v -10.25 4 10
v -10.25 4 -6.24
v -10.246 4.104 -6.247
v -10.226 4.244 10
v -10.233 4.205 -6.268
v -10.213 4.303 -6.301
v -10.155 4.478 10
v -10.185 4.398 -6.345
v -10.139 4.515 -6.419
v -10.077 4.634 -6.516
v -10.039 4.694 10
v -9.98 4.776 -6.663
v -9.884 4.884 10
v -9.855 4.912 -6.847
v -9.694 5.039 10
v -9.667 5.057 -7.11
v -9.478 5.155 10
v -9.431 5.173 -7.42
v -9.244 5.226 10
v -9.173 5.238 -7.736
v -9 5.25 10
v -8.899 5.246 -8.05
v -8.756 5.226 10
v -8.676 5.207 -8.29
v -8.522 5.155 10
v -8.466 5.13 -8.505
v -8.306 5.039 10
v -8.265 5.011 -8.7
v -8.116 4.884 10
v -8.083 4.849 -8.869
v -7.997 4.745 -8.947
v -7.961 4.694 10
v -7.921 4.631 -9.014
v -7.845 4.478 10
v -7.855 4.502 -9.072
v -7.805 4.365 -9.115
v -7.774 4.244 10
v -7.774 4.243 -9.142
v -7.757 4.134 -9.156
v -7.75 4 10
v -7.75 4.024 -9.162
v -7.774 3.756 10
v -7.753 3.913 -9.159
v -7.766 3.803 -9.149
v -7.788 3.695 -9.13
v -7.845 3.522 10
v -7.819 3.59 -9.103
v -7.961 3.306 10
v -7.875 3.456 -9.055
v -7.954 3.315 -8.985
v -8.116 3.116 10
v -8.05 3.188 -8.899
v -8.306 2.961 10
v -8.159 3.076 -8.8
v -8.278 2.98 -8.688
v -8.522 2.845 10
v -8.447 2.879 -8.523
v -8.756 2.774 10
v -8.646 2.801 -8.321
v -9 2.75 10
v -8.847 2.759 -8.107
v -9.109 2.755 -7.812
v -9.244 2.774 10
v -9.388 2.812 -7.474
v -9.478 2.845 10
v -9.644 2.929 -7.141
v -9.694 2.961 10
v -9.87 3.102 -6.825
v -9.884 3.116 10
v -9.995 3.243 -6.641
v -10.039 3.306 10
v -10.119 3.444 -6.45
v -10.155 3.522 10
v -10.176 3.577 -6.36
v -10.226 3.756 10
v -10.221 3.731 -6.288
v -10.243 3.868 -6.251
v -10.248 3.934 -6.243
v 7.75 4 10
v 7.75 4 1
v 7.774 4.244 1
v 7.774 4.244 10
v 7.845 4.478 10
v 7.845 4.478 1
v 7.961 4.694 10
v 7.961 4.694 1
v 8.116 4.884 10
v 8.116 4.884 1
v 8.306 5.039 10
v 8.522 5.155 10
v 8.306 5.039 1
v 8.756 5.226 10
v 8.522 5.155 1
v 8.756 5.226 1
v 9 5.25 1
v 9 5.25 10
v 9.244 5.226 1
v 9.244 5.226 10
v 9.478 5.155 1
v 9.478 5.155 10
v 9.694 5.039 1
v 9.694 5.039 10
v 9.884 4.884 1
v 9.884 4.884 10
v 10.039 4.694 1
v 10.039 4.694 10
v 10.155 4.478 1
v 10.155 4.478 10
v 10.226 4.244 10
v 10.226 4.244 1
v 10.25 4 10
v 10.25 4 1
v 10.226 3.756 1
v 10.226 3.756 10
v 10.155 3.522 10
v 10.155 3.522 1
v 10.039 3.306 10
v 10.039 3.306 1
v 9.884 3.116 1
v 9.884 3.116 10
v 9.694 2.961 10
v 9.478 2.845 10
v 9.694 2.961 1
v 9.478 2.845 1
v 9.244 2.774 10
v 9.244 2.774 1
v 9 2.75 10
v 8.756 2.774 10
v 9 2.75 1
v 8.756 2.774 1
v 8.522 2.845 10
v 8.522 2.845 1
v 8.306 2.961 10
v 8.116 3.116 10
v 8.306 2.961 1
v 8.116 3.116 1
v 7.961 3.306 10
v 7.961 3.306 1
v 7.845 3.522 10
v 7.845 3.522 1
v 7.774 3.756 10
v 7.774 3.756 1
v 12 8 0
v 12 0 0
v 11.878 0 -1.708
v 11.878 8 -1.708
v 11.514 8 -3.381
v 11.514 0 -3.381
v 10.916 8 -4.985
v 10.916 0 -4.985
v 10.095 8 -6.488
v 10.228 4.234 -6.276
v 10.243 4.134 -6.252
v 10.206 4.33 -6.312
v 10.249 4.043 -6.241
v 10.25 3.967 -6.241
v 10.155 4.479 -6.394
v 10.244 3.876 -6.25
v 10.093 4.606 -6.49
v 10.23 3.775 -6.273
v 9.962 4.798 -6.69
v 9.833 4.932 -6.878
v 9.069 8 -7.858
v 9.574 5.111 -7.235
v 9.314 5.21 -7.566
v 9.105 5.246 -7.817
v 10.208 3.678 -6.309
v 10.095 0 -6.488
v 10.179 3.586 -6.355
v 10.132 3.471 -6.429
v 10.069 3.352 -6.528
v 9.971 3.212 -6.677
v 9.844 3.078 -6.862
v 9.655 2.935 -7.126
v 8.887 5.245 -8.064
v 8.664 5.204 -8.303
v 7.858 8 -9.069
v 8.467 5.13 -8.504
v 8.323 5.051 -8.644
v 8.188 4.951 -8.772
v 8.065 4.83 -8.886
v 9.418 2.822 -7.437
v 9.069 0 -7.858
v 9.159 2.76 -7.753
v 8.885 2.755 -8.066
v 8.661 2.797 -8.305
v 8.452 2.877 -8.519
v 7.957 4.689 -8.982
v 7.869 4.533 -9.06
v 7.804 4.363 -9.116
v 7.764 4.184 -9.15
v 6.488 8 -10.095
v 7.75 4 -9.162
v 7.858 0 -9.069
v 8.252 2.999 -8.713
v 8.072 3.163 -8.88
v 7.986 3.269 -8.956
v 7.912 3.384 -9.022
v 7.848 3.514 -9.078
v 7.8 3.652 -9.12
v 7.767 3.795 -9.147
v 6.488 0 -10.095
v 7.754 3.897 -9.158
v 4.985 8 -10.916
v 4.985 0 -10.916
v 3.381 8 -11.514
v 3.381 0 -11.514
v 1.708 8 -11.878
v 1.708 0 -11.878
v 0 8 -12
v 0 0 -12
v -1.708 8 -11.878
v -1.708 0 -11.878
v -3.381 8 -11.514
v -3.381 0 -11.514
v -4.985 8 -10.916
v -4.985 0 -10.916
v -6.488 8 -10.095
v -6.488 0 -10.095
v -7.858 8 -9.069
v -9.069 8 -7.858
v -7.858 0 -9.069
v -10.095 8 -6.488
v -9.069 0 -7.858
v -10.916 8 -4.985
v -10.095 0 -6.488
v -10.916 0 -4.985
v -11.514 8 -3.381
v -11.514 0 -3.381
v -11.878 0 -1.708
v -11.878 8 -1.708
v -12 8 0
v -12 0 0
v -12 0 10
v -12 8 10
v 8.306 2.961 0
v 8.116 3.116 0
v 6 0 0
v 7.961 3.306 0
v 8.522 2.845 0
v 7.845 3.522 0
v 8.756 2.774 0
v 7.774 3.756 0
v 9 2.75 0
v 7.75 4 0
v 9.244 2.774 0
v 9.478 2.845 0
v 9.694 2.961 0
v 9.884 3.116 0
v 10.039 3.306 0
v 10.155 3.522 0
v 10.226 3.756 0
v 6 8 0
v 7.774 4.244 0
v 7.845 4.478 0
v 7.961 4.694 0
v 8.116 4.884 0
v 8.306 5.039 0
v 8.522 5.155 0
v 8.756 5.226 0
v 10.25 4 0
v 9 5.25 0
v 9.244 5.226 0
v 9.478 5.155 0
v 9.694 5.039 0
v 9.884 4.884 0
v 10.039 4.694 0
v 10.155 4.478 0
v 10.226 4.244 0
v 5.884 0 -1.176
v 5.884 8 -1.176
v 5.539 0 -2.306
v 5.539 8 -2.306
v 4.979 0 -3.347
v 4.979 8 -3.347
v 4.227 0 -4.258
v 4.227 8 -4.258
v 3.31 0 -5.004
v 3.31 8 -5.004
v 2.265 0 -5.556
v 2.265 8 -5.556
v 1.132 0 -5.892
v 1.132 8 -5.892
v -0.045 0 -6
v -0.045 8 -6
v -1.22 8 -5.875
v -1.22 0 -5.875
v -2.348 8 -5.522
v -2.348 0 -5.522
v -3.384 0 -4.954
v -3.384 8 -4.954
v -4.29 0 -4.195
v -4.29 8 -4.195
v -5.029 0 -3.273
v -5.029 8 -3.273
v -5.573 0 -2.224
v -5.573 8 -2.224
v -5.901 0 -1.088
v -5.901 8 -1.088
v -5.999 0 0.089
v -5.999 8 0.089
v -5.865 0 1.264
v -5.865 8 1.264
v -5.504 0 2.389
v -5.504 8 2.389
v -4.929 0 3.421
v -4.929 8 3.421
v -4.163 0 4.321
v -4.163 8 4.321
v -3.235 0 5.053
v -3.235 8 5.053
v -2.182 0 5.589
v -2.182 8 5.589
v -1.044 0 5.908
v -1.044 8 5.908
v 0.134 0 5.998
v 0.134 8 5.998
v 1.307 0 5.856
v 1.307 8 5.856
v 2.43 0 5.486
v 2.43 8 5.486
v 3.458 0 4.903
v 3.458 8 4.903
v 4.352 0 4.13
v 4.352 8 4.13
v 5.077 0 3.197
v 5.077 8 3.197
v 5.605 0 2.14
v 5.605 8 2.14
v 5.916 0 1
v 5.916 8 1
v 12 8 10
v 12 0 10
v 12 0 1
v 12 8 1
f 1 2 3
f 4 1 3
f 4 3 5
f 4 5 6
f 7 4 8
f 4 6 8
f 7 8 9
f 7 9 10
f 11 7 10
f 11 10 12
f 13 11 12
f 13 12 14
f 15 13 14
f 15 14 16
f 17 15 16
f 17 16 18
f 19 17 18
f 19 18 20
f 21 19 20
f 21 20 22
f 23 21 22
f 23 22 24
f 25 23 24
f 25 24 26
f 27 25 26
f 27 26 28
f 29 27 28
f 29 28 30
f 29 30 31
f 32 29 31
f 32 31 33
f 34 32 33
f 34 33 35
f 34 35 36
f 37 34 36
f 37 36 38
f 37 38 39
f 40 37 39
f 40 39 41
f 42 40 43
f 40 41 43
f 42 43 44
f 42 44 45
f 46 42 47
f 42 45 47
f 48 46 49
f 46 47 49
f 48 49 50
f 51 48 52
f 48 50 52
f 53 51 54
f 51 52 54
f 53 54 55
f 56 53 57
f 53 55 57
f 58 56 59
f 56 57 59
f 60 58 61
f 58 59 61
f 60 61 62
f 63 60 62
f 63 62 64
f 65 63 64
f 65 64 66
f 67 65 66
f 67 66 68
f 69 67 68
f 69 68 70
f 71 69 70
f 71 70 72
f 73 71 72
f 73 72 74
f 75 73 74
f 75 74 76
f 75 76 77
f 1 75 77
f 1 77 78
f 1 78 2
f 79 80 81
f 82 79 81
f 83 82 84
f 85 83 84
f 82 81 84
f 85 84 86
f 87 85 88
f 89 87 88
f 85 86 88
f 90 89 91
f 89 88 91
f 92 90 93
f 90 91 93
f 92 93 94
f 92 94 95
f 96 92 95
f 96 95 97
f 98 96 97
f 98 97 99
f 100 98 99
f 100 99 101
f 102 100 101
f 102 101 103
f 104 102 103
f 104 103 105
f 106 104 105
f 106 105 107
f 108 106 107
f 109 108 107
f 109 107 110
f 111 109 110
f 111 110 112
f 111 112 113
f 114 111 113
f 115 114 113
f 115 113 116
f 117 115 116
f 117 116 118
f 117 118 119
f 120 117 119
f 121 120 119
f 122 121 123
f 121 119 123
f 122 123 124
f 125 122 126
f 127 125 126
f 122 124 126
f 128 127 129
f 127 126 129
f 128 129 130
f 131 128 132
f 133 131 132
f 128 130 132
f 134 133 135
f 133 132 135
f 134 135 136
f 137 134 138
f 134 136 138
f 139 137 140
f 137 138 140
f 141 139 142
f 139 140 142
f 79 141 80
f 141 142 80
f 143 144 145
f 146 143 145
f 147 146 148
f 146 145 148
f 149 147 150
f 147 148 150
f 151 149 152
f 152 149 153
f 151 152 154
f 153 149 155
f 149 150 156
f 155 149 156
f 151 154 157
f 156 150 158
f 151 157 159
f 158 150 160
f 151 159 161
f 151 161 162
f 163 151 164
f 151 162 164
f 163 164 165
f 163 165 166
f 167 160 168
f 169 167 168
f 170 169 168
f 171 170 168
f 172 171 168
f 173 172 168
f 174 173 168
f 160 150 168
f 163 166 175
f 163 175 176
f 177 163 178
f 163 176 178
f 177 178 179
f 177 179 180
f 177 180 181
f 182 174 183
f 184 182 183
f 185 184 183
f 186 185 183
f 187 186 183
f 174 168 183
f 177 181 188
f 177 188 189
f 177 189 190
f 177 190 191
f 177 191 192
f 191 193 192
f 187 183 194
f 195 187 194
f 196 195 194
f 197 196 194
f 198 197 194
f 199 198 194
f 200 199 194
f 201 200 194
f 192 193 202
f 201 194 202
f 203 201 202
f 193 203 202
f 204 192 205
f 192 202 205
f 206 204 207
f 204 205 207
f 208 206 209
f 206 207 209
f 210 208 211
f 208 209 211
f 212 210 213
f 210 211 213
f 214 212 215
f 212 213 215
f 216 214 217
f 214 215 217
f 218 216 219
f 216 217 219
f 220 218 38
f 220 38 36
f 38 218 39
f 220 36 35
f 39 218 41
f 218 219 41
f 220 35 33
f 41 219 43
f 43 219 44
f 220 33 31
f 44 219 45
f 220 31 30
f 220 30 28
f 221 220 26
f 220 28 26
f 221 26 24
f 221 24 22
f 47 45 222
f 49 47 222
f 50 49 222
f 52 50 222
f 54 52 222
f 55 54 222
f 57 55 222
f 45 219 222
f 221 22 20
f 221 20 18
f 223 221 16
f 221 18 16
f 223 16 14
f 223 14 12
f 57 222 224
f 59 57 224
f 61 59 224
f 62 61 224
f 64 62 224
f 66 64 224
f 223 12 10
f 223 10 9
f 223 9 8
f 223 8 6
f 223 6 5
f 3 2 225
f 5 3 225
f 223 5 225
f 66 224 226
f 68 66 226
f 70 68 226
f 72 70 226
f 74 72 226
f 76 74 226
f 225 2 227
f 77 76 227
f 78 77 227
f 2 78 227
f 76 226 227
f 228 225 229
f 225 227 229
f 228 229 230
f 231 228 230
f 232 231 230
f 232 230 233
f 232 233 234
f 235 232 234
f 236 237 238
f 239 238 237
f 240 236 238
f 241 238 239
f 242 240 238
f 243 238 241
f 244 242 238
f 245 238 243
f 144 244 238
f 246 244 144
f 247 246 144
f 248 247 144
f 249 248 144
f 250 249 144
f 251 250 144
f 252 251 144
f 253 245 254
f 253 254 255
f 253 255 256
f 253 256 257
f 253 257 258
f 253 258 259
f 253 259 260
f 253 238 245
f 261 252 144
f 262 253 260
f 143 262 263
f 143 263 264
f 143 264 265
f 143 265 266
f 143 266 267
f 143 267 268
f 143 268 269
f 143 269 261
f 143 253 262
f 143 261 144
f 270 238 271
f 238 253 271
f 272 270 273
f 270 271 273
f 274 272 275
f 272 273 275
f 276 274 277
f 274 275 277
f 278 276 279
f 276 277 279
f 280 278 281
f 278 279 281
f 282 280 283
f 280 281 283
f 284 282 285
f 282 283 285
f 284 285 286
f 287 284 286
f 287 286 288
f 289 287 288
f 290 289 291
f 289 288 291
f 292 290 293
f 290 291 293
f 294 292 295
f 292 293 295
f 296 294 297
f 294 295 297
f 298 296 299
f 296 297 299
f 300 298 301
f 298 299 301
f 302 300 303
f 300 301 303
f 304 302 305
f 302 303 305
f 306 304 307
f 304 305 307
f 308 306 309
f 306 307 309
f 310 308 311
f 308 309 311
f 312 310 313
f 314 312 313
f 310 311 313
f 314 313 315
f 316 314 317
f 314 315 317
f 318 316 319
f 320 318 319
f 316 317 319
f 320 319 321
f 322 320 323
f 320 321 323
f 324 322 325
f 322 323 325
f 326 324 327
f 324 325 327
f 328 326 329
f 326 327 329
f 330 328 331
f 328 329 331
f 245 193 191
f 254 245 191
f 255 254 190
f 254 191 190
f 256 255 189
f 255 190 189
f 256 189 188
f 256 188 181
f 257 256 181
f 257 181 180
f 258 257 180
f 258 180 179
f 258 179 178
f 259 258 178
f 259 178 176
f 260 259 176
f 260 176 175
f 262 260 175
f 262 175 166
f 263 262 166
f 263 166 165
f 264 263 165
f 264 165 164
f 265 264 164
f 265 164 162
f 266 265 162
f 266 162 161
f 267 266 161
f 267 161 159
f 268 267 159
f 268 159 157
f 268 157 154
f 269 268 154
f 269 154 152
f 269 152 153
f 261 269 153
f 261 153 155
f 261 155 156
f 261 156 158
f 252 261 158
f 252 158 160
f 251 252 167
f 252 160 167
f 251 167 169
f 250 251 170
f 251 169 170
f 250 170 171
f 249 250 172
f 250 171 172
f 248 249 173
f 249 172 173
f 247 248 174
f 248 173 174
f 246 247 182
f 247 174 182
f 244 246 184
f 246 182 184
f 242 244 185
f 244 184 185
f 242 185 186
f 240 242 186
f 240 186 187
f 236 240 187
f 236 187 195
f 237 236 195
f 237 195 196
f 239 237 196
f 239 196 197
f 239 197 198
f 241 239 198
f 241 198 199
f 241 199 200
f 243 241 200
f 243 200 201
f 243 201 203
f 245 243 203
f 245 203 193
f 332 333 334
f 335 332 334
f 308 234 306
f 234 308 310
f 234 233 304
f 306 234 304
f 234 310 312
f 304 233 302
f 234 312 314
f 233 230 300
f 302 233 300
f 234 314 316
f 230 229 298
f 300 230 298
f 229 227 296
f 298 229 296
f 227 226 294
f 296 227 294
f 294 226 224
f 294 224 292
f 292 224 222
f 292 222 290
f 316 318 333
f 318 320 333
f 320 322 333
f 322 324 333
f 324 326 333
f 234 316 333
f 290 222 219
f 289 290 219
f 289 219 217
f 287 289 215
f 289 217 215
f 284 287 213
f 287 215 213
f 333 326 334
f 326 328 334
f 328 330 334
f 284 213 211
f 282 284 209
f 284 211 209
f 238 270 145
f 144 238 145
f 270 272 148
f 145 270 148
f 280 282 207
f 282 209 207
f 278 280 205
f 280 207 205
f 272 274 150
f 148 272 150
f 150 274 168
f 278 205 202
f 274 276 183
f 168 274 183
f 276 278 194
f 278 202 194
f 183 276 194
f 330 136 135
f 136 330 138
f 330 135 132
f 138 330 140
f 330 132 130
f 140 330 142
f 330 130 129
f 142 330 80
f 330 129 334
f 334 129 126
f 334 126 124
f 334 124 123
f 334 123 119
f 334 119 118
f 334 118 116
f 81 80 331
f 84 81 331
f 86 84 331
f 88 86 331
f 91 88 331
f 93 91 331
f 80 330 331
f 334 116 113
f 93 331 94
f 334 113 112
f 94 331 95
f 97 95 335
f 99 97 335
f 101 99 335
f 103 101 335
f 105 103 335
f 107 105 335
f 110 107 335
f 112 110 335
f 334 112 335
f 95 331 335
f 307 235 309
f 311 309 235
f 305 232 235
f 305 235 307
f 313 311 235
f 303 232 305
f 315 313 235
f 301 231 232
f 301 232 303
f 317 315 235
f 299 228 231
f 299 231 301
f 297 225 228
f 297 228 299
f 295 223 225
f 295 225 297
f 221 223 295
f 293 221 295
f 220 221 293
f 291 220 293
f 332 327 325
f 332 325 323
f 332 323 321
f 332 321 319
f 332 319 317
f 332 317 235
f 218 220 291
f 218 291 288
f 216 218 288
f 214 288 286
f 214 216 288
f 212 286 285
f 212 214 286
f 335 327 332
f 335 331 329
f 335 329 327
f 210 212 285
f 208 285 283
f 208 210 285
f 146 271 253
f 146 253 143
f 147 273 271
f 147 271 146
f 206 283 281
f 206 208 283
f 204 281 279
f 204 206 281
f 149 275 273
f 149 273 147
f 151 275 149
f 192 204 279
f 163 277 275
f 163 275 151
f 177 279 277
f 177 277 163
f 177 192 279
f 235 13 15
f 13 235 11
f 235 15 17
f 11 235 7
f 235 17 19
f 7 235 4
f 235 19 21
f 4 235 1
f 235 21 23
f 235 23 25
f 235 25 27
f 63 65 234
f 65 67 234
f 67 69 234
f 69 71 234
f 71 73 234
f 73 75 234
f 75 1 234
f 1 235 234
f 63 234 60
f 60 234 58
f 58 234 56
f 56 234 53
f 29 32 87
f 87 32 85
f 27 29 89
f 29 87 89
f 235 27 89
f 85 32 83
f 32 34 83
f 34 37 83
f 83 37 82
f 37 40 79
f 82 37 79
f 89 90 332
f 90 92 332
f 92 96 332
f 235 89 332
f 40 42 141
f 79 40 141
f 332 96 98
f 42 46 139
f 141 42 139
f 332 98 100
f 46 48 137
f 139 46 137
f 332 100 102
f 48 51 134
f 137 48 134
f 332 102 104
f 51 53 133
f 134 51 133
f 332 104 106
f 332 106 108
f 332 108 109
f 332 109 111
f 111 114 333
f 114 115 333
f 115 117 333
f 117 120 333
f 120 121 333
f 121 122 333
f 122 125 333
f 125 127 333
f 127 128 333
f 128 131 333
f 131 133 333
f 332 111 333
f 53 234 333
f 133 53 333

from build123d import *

# Parameters (mm, degrees)
BOSS_EXTRUDE1_DEPTH         = 8
SKETCH2_R                   = 6
CUT_EXTRUDE1_DEPTH          = 19.761663039
TAP_DRILL_FOR_M3X0_5_TAP1_D = 2.5
SKETCH6_W                   = 12
SKETCH6_H                   = 1
CUT_EXTRUDE2_DEPTH          = 8


with BuildPart() as part:
    # Sketch1 → Boss-Extrude1 (new body)
    with BuildSketch(Plane(origin=(0, 0, 0), x_dir=(1, 0, 0), z_dir=(0, 1, 0))):
        with BuildLine():
            Line((-12, -10), (12, -10))
            Line((12, -10), (12, 0))
            ThreePointArc((12, 0), (0, 12), (-12, 0))
            Line((-12, 0), (-12, -10))
        make_face()
    extrude(amount=BOSS_EXTRUDE1_DEPTH)

    # Sketch2 → Cut-Extrude1 (cut, through all)
    with BuildSketch(Plane(origin=(0, 8, 0), x_dir=(1, 0, 0), z_dir=(0, 1, 0))):
        with Locations(Location((0, 0, 0), (0, 0, 270))):
            Circle(SKETCH2_R)
    extrude(amount=-CUT_EXTRUDE1_DEPTH, mode=Mode.SUBTRACT)

    # Tap Drill for M3x0.5 Tap1 (through all)
    with Locations(Plane.XY.offset(10)):
        with Locations((-9, 4), (9, 4)):
            Hole(TAP_DRILL_FOR_M3X0_5_TAP1_D / 2)

    # Sketch6 → Cut-Extrude2 (cut)
    with BuildSketch(Plane(origin=(0, 8, 0), x_dir=(1, 0, 0), z_dir=(0, 1, 0))):
        with Locations((6, -0.5)):
            Rectangle(SKETCH6_W, SKETCH6_H)
    extrude(amount=-CUT_EXTRUDE2_DEPTH, mode=Mode.SUBTRACT)


solid = part.part
